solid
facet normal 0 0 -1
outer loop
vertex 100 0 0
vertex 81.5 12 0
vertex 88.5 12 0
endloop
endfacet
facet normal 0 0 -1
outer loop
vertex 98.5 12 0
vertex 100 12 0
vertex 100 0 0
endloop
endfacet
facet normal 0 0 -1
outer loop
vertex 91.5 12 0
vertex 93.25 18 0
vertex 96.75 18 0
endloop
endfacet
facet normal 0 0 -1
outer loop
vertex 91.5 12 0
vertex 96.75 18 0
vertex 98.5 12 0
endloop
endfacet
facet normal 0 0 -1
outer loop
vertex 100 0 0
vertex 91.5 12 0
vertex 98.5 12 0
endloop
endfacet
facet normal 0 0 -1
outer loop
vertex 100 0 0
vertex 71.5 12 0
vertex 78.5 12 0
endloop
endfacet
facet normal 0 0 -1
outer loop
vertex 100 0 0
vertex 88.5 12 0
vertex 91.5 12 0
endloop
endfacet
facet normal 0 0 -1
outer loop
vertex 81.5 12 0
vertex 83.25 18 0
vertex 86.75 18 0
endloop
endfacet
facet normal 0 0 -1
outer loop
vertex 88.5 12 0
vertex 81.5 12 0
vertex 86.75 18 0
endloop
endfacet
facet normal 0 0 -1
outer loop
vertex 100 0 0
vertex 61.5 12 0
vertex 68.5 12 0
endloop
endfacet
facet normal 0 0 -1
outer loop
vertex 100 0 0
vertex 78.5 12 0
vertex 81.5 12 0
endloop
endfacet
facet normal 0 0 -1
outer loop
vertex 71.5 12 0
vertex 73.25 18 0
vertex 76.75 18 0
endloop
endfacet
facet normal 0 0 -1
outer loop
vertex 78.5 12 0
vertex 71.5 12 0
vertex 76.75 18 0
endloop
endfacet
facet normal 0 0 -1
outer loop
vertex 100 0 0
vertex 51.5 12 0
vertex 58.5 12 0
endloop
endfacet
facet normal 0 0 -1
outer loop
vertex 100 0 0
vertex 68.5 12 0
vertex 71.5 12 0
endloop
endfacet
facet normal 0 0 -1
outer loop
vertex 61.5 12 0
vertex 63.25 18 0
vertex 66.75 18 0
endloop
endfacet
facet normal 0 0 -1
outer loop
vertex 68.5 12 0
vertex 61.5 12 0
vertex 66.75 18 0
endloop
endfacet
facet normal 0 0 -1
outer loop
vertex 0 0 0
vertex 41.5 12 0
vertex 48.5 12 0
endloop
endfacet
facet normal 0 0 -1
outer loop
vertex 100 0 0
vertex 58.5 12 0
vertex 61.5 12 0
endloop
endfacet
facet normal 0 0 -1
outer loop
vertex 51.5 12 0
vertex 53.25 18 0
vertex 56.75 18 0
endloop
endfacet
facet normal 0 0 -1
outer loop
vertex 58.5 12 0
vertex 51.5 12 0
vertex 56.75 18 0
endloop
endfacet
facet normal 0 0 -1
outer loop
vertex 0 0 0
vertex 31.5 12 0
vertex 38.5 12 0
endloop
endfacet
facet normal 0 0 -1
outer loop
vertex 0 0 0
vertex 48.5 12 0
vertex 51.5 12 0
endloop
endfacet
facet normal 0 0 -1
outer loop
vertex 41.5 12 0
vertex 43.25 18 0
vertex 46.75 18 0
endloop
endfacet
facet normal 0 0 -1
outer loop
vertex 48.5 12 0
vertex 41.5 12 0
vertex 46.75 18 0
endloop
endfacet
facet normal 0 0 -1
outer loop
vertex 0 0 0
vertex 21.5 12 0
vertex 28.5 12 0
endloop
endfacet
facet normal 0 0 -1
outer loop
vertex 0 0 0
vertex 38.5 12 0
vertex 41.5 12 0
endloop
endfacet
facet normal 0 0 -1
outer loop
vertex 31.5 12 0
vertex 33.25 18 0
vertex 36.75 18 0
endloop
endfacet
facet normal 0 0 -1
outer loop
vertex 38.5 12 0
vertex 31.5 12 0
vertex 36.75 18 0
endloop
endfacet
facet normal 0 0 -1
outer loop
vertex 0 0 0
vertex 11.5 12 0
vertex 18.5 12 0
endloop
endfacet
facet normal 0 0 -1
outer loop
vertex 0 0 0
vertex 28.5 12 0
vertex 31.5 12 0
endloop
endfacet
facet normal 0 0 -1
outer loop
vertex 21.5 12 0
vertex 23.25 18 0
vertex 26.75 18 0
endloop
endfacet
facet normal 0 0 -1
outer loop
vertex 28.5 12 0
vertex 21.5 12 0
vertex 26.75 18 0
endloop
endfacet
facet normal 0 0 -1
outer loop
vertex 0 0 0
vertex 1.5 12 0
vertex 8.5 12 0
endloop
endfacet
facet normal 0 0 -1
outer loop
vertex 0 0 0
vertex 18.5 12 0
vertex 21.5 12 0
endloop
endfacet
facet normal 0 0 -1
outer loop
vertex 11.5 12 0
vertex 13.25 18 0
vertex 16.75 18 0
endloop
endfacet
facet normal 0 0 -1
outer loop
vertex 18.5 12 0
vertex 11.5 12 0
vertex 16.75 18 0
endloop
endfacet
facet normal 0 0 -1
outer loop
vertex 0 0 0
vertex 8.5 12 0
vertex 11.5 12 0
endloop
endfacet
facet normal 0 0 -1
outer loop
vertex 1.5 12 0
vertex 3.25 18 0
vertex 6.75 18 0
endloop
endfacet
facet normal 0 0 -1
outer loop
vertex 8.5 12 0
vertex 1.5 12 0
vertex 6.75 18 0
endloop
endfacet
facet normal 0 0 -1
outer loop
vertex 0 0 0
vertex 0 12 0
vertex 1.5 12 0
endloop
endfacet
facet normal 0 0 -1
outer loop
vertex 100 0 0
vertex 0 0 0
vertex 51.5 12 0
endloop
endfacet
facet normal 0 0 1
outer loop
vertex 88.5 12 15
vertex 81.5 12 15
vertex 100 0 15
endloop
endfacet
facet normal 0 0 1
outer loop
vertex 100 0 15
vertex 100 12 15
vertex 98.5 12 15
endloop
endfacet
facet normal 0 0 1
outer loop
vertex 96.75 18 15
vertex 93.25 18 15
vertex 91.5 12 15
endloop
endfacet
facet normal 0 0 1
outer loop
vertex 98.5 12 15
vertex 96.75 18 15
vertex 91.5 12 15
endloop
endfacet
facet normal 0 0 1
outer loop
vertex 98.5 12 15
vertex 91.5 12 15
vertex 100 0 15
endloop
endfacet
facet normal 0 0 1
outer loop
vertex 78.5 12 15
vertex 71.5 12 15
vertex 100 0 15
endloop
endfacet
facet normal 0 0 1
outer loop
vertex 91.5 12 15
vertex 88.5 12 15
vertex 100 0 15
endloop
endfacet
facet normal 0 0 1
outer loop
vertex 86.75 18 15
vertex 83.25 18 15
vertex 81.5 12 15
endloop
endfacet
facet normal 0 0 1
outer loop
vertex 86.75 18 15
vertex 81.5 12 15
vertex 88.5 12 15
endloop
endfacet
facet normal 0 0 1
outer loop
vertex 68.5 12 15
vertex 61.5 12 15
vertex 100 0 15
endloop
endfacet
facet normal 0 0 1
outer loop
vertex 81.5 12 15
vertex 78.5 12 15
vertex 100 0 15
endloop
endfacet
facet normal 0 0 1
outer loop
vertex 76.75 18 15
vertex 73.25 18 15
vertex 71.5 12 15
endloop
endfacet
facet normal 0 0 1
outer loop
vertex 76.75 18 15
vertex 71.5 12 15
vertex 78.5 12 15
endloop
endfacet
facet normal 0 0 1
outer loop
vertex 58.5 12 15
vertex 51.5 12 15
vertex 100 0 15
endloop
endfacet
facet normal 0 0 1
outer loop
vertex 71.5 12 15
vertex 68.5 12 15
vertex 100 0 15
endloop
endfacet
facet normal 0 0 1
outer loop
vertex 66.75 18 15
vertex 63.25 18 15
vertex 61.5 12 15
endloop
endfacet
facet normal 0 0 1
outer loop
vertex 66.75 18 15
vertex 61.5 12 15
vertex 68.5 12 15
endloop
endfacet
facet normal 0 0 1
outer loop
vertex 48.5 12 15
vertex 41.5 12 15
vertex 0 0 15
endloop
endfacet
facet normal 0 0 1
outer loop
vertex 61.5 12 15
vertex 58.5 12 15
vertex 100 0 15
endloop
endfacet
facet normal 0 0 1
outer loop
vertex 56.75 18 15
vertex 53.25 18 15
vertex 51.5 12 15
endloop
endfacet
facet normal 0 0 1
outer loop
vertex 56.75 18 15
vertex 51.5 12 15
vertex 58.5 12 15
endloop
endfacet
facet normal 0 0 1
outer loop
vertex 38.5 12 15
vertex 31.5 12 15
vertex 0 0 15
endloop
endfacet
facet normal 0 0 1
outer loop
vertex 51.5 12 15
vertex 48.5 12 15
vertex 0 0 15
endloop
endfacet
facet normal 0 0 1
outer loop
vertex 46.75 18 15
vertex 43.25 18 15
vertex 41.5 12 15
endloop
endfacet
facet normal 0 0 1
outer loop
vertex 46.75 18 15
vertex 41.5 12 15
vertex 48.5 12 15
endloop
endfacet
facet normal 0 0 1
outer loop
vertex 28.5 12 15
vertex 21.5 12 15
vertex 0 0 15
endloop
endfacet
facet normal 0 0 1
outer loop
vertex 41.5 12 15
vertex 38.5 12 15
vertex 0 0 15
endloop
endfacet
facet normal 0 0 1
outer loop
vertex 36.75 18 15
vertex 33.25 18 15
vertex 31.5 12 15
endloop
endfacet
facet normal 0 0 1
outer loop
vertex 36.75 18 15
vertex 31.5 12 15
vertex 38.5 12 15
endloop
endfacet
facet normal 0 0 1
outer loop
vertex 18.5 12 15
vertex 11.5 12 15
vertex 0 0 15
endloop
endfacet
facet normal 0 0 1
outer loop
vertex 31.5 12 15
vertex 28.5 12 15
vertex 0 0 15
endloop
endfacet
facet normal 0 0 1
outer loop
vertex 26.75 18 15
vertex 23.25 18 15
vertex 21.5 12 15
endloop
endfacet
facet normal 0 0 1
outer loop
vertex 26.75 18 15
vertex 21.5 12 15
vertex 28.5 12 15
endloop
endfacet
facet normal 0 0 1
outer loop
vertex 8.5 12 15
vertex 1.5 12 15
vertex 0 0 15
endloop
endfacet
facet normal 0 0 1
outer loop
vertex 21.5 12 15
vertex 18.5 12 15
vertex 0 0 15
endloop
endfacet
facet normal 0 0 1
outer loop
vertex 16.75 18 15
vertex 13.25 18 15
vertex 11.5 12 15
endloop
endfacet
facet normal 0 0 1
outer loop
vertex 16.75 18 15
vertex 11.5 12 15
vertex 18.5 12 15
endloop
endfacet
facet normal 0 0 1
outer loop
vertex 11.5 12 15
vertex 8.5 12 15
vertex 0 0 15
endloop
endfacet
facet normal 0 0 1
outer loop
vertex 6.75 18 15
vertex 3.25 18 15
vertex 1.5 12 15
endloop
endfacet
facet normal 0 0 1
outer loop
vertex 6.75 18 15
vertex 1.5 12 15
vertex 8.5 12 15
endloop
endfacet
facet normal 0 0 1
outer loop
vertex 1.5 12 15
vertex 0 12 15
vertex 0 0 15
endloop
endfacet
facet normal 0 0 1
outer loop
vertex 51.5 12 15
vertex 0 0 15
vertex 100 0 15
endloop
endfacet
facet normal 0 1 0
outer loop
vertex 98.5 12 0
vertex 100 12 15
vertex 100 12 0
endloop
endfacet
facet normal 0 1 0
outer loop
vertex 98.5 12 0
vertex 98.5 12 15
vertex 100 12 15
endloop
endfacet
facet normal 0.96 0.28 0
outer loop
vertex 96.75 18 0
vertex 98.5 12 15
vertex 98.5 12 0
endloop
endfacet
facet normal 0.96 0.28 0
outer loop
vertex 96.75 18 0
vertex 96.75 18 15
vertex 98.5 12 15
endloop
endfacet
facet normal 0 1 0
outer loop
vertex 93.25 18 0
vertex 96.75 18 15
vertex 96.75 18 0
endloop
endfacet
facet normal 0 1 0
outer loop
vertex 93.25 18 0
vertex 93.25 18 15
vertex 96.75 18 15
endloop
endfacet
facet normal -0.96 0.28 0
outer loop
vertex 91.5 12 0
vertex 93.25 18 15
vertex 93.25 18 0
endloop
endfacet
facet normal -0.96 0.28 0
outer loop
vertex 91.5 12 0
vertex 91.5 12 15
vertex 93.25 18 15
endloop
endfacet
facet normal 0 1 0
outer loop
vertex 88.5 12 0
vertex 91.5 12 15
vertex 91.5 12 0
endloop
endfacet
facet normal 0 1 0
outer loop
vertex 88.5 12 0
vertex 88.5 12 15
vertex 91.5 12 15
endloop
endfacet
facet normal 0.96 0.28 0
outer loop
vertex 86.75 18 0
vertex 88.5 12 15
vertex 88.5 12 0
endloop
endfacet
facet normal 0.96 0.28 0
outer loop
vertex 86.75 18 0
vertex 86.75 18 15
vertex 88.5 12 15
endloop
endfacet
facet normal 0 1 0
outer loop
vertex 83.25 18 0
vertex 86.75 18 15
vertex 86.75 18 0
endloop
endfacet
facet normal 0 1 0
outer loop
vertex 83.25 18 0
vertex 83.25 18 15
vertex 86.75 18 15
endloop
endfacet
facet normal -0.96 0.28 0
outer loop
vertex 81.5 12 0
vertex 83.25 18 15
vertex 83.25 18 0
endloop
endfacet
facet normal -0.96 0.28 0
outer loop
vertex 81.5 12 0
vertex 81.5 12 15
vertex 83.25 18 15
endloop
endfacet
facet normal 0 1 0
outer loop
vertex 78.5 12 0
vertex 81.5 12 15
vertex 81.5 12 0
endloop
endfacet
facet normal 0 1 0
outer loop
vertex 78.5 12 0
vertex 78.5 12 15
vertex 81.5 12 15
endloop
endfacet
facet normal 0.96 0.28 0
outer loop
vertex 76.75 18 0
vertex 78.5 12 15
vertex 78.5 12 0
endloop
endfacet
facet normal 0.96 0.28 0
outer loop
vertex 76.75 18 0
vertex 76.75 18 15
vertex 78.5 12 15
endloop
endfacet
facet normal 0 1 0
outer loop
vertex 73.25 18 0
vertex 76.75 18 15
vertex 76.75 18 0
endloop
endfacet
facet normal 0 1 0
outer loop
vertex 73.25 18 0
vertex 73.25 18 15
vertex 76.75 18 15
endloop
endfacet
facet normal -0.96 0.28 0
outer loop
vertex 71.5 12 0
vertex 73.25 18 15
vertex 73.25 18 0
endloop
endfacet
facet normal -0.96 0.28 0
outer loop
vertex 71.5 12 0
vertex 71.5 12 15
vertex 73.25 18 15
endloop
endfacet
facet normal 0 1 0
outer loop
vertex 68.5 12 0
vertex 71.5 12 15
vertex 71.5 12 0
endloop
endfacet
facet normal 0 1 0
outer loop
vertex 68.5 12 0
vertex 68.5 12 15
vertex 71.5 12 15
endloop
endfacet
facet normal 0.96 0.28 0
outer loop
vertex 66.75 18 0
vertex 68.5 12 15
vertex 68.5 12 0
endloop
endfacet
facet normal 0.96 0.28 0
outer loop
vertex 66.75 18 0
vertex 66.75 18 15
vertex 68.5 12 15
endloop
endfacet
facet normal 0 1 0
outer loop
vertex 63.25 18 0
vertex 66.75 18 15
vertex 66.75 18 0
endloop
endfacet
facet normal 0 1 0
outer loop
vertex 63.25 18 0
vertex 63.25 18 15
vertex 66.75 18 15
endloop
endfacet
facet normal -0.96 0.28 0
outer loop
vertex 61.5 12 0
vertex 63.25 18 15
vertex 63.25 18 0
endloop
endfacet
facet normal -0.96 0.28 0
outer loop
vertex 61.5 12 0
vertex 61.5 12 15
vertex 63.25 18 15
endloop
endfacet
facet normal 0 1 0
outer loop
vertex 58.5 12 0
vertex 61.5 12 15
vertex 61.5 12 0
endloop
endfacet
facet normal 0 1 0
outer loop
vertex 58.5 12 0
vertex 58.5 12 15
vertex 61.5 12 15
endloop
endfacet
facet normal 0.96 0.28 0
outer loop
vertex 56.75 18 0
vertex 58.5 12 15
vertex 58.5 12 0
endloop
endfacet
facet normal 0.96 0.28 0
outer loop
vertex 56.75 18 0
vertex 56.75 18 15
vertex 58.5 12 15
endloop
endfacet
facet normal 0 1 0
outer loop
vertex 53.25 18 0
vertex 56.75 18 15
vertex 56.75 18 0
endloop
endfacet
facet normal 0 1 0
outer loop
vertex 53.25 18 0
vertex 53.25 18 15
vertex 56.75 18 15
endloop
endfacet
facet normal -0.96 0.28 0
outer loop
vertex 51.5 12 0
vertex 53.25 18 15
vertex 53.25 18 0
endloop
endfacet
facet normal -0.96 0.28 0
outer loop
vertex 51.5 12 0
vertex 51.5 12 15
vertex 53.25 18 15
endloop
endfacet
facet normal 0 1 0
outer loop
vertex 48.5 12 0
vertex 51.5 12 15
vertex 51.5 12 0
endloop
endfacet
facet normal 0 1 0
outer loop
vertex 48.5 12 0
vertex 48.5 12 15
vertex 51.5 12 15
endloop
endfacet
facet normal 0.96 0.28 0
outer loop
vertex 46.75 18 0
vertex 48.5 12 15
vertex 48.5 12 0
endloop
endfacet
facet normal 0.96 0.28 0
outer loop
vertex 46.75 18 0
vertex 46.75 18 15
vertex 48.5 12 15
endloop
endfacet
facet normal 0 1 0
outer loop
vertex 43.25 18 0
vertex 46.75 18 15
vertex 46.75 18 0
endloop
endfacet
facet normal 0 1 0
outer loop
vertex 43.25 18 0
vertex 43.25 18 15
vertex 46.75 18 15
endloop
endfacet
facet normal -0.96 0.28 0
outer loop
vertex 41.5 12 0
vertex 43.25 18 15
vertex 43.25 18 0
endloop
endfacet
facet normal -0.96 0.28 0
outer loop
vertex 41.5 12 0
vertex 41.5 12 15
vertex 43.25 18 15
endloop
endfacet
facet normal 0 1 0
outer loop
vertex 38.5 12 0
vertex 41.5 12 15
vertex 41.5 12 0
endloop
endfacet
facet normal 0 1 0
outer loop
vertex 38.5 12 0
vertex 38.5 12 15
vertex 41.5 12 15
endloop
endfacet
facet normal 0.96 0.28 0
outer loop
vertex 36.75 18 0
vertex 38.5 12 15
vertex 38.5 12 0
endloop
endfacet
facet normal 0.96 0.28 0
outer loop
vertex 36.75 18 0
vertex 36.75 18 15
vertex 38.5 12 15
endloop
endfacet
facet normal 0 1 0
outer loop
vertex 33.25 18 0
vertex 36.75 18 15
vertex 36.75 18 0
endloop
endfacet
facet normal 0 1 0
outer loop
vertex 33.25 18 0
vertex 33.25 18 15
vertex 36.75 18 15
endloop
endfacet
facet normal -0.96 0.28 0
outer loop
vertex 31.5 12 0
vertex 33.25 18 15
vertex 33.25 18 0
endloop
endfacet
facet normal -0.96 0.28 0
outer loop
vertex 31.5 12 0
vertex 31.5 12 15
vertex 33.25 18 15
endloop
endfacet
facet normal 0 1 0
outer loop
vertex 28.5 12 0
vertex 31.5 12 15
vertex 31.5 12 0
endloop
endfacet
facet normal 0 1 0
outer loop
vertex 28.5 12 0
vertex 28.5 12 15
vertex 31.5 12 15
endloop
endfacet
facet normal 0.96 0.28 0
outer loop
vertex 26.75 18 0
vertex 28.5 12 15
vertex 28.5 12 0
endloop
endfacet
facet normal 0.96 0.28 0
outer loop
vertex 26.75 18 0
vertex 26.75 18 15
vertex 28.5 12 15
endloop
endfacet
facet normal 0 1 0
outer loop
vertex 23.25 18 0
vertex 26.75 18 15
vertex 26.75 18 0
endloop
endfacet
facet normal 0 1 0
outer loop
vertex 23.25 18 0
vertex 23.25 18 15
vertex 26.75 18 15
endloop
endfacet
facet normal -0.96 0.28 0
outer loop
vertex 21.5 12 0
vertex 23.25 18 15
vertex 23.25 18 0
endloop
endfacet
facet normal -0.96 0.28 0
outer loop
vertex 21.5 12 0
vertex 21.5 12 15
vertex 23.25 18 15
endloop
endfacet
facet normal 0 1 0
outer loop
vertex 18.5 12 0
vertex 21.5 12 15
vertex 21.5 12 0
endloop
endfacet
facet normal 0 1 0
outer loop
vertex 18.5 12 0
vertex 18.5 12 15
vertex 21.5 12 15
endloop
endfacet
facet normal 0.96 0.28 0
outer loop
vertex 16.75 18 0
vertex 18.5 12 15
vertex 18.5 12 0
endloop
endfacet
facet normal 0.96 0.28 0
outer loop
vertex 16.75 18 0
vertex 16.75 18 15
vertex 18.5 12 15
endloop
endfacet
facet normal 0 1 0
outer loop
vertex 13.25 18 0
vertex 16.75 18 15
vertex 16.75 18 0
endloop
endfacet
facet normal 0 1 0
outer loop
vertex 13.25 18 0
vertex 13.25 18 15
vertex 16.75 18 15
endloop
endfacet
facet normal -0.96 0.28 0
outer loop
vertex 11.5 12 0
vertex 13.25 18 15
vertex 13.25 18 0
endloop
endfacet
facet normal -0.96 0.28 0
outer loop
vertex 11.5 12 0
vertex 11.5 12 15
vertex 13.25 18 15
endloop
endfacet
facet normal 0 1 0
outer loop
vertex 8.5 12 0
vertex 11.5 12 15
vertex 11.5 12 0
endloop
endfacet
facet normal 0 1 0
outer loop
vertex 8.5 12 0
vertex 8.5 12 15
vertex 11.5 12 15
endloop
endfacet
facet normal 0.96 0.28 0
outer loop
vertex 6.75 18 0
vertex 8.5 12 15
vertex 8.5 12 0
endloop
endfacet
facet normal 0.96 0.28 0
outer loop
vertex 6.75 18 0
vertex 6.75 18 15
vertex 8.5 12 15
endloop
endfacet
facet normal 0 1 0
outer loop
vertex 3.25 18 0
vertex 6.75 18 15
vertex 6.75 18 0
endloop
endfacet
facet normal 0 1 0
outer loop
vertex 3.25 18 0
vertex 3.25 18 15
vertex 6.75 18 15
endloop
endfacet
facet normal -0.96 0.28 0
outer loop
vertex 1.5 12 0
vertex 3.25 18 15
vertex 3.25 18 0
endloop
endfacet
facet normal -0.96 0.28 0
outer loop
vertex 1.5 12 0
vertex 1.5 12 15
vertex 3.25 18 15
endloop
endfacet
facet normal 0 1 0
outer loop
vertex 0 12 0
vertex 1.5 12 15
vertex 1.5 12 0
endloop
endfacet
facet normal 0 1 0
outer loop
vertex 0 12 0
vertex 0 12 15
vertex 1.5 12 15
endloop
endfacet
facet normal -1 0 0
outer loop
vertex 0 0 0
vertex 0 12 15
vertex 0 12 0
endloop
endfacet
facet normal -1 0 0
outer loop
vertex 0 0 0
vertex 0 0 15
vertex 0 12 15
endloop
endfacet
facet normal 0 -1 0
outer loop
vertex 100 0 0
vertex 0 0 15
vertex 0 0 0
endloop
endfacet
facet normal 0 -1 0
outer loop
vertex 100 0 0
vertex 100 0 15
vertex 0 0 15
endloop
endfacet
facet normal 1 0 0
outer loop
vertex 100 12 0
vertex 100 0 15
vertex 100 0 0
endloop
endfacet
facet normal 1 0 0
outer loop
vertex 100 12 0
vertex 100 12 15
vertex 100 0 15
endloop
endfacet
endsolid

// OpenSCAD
$fn = 32;

// ----------------------------------------------------------------------
// Gear rack: 10 teeth, pitch 10 mm
// ----------------------------------------------------------------------

// --- parameters (mm) ---
teeth = 10;               // number of teeth
pitch = 10;               // tooth pitch, X
root_w = 7;               // tooth width at the root
tip_w = 3.5;              // tooth width at the tip
base_h = 12;              // rack body height, Y
tooth_h = 6;              // tooth height above the body
plate_t = 15;             // rack width, Z (extrusion height)
fit_tol = 0.05;           // declared fit tolerance (prompt contract)
free_tol = 0.3;           // declared free tolerance (prompt contract)

rack_l = teeth * pitch;  // overall length
total_h = base_h + tooth_h;  // overall height

profile = [[0, 0], [100, 0], [100, 12], [98.5, 12], [96.75, 18], [93.25, 18], [91.5, 12], [88.5, 12], [86.75, 18], [83.25, 18], [81.5, 12], [78.5, 12], [76.75, 18], [73.25, 18], [71.5, 12], [68.5, 12], [66.75, 18], [63.25, 18], [61.5, 12], [58.5, 12], [56.75, 18], [53.25, 18], [51.5, 12], [48.5, 12], [46.75, 18], [43.25, 18], [41.5, 12], [38.5, 12], [36.75, 18], [33.25, 18], [31.5, 12], [28.5, 12], [26.75, 18], [23.25, 18], [21.5, 12], [18.5, 12], [16.75, 18], [13.25, 18], [11.5, 12], [8.5, 12], [6.75, 18], [3.25, 18], [1.5, 12], [0, 12]];  // primary outline, 44 points, counter clockwise

// --- the one profile operation ---
linear_extrude(height = plate_t) polygon(points = profile);
